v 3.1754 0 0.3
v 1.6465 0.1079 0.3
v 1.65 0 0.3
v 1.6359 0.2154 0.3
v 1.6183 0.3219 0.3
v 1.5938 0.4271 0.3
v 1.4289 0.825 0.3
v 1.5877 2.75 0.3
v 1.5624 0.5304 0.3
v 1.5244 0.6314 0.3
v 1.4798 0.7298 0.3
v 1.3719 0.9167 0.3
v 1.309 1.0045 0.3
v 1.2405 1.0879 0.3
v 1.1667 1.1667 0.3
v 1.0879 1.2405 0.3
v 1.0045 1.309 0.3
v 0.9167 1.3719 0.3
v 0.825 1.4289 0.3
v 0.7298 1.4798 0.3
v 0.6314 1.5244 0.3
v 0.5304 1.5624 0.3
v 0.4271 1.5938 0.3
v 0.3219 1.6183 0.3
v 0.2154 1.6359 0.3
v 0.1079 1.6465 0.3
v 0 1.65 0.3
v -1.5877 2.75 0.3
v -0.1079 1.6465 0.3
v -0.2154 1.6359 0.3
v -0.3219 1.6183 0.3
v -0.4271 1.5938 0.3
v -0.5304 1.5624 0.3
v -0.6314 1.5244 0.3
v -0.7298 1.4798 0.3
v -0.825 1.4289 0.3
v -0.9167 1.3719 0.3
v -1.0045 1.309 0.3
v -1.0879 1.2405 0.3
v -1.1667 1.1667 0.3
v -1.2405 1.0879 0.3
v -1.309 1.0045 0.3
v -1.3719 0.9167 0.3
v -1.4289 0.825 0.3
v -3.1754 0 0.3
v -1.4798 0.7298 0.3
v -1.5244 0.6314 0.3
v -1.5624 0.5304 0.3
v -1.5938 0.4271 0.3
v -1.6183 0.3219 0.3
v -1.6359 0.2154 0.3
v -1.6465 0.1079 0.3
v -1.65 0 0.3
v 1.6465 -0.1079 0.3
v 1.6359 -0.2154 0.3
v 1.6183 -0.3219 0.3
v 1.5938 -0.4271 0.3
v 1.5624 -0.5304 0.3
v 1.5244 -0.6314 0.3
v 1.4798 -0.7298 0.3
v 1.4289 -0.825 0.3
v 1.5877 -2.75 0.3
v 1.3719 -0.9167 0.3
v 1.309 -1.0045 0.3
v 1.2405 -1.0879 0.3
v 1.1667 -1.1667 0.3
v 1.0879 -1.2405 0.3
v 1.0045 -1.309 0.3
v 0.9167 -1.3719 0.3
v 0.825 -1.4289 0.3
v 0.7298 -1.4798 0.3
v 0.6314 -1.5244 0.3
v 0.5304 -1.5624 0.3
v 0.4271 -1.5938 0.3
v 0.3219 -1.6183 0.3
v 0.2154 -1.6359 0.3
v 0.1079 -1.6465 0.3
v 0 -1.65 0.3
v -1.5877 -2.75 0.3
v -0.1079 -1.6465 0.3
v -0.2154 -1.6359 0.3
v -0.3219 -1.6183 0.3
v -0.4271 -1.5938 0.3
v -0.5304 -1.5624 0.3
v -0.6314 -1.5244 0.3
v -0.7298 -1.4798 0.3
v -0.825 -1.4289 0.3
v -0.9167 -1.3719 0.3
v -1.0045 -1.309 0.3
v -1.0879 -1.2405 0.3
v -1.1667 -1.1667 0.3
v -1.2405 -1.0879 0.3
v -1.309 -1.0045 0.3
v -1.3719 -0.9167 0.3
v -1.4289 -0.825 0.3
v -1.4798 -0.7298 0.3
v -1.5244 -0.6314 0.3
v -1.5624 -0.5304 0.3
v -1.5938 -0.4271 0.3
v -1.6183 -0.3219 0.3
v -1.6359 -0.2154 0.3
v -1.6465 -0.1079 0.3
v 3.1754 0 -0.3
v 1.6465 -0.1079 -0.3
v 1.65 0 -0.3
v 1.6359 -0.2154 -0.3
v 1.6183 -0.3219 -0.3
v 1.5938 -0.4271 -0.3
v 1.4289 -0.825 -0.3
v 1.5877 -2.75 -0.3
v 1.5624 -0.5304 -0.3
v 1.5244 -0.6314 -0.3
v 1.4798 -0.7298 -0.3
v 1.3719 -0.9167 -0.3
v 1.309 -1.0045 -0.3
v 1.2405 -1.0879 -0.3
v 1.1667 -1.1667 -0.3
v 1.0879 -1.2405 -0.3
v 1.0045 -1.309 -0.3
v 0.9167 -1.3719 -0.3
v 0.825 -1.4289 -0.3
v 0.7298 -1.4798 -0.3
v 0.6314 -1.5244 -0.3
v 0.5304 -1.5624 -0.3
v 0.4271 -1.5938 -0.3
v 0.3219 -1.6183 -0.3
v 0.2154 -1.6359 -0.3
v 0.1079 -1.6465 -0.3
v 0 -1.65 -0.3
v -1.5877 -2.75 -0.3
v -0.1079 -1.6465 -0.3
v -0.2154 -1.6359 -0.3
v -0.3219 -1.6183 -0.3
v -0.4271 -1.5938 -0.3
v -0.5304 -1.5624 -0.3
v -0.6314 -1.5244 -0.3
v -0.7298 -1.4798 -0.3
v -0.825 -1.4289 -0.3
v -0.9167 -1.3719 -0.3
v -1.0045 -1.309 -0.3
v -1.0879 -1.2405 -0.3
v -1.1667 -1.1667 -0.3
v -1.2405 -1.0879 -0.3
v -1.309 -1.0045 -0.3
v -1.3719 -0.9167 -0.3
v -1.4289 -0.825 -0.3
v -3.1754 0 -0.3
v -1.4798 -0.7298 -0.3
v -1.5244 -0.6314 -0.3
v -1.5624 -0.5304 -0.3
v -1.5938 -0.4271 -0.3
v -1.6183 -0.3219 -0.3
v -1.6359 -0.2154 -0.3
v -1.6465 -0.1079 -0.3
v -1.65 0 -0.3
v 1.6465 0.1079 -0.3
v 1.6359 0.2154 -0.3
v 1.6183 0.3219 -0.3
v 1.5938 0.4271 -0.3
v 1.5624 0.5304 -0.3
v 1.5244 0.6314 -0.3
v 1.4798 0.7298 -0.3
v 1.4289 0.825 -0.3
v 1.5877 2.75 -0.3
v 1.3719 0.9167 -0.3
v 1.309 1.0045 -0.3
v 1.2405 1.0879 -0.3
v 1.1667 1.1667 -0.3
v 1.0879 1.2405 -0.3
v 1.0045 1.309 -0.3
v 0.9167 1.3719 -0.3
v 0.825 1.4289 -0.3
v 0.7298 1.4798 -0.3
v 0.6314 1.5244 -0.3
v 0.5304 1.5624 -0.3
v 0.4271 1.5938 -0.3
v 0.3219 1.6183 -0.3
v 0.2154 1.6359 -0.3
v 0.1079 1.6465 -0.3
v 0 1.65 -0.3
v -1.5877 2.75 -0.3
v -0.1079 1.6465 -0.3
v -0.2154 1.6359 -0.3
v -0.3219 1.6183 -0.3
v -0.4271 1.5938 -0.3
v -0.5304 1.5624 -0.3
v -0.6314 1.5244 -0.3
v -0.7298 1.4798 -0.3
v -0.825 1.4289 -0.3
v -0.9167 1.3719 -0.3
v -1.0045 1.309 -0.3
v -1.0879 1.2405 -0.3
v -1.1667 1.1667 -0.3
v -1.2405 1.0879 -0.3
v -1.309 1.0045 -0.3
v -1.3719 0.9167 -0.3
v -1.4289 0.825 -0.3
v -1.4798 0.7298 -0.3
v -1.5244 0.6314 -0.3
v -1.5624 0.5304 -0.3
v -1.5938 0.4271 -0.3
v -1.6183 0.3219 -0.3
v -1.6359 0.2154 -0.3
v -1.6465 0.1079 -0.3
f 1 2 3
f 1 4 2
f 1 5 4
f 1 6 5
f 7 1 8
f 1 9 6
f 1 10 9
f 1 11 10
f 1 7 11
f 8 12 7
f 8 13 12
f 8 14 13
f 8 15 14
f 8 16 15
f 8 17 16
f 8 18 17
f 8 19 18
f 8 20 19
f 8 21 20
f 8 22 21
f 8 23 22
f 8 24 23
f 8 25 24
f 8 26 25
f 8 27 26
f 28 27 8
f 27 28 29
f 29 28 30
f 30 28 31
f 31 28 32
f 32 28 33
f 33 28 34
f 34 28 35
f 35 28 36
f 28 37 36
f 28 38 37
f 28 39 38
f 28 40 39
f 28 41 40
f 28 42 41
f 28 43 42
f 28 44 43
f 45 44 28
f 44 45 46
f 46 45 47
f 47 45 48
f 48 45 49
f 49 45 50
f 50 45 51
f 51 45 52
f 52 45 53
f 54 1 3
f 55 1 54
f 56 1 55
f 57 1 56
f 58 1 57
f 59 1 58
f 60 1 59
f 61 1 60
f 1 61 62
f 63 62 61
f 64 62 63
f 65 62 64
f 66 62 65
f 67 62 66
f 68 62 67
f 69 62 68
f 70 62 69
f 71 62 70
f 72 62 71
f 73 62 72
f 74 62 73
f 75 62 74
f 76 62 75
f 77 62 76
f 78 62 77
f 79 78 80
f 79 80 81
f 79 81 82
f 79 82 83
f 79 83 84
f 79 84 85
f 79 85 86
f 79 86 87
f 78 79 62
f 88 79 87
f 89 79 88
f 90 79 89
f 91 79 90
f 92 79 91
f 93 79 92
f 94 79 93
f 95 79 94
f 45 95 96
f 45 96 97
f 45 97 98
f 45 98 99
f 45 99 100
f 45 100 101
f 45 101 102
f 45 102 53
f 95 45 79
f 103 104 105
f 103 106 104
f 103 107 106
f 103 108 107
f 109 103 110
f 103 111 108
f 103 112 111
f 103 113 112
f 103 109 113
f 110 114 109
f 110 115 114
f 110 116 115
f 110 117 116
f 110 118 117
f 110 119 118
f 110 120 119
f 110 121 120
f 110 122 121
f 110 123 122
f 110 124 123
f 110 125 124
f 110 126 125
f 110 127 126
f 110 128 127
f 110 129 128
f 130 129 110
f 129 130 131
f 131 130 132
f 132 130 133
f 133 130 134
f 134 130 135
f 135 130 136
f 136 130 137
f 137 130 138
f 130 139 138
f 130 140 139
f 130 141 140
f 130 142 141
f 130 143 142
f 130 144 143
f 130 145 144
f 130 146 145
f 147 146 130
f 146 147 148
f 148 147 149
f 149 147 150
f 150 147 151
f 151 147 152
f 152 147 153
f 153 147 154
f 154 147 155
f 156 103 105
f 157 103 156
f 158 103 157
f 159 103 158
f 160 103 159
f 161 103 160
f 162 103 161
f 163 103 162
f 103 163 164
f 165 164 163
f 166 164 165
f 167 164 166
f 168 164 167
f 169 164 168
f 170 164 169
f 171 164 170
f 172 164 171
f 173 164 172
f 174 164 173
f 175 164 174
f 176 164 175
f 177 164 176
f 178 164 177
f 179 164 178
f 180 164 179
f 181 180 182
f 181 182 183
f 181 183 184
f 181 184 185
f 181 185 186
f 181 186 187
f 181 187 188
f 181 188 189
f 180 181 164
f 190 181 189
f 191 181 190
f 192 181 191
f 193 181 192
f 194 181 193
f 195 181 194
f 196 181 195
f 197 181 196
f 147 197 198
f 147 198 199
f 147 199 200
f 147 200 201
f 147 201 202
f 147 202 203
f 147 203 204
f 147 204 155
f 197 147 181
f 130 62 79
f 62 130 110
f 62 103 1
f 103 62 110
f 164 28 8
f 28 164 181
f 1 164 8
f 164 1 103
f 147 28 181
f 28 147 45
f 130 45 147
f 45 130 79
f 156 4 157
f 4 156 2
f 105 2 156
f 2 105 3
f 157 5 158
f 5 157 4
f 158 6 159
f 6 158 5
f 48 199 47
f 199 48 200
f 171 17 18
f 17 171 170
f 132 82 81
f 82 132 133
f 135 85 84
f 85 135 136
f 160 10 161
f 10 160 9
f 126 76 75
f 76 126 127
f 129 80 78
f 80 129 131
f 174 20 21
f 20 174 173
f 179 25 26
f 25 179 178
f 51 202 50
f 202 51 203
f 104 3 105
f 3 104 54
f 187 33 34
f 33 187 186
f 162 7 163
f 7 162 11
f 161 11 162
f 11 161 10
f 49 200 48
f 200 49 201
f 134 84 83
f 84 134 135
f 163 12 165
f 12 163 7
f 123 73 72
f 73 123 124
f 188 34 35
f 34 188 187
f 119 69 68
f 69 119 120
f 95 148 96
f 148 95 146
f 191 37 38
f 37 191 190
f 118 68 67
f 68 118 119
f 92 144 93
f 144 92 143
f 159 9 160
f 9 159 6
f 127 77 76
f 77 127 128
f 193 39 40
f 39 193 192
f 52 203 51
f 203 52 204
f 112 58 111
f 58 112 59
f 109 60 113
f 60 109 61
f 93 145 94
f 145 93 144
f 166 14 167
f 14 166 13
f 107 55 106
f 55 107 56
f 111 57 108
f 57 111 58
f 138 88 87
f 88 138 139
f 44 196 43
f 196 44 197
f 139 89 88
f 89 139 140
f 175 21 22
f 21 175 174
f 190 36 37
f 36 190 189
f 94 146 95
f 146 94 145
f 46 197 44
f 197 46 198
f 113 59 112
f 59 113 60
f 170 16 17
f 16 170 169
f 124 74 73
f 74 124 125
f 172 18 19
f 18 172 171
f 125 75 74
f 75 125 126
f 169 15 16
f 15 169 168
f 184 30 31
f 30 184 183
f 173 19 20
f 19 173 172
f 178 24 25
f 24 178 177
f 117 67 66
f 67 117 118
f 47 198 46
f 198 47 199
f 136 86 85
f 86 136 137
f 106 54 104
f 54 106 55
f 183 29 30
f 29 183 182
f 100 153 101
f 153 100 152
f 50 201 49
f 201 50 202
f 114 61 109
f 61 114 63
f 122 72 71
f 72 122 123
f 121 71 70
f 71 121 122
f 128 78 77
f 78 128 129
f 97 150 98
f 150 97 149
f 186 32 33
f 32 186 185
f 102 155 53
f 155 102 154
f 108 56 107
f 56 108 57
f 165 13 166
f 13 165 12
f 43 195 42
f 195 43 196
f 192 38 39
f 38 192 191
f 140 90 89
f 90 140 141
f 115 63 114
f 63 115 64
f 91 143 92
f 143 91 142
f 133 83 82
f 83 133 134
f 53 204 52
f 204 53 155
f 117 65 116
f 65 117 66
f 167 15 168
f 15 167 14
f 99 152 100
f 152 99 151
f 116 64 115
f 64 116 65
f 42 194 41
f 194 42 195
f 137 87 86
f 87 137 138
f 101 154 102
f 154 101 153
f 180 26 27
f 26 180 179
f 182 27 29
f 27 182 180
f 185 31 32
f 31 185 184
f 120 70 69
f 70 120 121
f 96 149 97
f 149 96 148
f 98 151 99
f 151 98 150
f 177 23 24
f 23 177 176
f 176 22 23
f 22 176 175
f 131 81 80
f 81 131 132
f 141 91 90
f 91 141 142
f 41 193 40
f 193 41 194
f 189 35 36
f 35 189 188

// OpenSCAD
// Thin hex nut for M3 screw
thread_nominal_diameter_mm = 3.0; //[1.5:6.0:0.1]
across_flats_mm = 5.5;            //[3.0:11.0:0.1]
thickness_mm = 1.8;               //[0.9:3.6:0.1]
clearance_hole_diameter_mm = 3.2; //[2.8:4.5:0.1]
chamfer_mm = 0.2;                 //[0.0:0.6:0.05]
tolerance_mm = 0.1;               //[0.0:0.3:0.05]
overlap_mm = 0.8;                 //[0.5:2.0:0.1]

$fn = 96;

// Convert across-flats to circumradius for a regular hex:
// across_flats = 2 * apothem, apothem = R * cos(30°) => R = across_flats / sqrt(3)
hex_circumradius_mm = across_flats_mm / sqrt(3);

// Use a circular clearance hole suitable for M3
hole_diameter_mm = clearance_hole_diameter_mm + tolerance_mm;

module thin_hex_nut() {
    difference() {
        // Hex body
        cylinder(r = hex_circumradius_mm, h = thickness_mm, center = true, $fn = 6);

        // Round through-hole
        cylinder(d = hole_diameter_mm, h = thickness_mm + 2*overlap_mm, center = true, $fn = 96);

        // Small edge chamfers (top and bottom), kept subtle to avoid creating a flange
        if (chamfer_mm > 0) {
            // Top chamfer
            translate([0, 0, thickness_mm/2 - chamfer_mm/2])
                cylinder(r1 = hex_circumradius_mm + overlap_mm,
                         r2 = hex_circumradius_mm - chamfer_mm,
                         h  = chamfer_mm + overlap_mm,
                         center = true, $fn = 6);

            // Bottom chamfer
            translate([0, 0, -thickness_mm/2 + chamfer_mm/2])
                cylinder(r1 = hex_circumradius_mm - chamfer_mm,
                         r2 = hex_circumradius_mm + overlap_mm,
                         h  = chamfer_mm + overlap_mm,
                         center = true, $fn = 6);
        }
    }
}

thin_hex_nut();
